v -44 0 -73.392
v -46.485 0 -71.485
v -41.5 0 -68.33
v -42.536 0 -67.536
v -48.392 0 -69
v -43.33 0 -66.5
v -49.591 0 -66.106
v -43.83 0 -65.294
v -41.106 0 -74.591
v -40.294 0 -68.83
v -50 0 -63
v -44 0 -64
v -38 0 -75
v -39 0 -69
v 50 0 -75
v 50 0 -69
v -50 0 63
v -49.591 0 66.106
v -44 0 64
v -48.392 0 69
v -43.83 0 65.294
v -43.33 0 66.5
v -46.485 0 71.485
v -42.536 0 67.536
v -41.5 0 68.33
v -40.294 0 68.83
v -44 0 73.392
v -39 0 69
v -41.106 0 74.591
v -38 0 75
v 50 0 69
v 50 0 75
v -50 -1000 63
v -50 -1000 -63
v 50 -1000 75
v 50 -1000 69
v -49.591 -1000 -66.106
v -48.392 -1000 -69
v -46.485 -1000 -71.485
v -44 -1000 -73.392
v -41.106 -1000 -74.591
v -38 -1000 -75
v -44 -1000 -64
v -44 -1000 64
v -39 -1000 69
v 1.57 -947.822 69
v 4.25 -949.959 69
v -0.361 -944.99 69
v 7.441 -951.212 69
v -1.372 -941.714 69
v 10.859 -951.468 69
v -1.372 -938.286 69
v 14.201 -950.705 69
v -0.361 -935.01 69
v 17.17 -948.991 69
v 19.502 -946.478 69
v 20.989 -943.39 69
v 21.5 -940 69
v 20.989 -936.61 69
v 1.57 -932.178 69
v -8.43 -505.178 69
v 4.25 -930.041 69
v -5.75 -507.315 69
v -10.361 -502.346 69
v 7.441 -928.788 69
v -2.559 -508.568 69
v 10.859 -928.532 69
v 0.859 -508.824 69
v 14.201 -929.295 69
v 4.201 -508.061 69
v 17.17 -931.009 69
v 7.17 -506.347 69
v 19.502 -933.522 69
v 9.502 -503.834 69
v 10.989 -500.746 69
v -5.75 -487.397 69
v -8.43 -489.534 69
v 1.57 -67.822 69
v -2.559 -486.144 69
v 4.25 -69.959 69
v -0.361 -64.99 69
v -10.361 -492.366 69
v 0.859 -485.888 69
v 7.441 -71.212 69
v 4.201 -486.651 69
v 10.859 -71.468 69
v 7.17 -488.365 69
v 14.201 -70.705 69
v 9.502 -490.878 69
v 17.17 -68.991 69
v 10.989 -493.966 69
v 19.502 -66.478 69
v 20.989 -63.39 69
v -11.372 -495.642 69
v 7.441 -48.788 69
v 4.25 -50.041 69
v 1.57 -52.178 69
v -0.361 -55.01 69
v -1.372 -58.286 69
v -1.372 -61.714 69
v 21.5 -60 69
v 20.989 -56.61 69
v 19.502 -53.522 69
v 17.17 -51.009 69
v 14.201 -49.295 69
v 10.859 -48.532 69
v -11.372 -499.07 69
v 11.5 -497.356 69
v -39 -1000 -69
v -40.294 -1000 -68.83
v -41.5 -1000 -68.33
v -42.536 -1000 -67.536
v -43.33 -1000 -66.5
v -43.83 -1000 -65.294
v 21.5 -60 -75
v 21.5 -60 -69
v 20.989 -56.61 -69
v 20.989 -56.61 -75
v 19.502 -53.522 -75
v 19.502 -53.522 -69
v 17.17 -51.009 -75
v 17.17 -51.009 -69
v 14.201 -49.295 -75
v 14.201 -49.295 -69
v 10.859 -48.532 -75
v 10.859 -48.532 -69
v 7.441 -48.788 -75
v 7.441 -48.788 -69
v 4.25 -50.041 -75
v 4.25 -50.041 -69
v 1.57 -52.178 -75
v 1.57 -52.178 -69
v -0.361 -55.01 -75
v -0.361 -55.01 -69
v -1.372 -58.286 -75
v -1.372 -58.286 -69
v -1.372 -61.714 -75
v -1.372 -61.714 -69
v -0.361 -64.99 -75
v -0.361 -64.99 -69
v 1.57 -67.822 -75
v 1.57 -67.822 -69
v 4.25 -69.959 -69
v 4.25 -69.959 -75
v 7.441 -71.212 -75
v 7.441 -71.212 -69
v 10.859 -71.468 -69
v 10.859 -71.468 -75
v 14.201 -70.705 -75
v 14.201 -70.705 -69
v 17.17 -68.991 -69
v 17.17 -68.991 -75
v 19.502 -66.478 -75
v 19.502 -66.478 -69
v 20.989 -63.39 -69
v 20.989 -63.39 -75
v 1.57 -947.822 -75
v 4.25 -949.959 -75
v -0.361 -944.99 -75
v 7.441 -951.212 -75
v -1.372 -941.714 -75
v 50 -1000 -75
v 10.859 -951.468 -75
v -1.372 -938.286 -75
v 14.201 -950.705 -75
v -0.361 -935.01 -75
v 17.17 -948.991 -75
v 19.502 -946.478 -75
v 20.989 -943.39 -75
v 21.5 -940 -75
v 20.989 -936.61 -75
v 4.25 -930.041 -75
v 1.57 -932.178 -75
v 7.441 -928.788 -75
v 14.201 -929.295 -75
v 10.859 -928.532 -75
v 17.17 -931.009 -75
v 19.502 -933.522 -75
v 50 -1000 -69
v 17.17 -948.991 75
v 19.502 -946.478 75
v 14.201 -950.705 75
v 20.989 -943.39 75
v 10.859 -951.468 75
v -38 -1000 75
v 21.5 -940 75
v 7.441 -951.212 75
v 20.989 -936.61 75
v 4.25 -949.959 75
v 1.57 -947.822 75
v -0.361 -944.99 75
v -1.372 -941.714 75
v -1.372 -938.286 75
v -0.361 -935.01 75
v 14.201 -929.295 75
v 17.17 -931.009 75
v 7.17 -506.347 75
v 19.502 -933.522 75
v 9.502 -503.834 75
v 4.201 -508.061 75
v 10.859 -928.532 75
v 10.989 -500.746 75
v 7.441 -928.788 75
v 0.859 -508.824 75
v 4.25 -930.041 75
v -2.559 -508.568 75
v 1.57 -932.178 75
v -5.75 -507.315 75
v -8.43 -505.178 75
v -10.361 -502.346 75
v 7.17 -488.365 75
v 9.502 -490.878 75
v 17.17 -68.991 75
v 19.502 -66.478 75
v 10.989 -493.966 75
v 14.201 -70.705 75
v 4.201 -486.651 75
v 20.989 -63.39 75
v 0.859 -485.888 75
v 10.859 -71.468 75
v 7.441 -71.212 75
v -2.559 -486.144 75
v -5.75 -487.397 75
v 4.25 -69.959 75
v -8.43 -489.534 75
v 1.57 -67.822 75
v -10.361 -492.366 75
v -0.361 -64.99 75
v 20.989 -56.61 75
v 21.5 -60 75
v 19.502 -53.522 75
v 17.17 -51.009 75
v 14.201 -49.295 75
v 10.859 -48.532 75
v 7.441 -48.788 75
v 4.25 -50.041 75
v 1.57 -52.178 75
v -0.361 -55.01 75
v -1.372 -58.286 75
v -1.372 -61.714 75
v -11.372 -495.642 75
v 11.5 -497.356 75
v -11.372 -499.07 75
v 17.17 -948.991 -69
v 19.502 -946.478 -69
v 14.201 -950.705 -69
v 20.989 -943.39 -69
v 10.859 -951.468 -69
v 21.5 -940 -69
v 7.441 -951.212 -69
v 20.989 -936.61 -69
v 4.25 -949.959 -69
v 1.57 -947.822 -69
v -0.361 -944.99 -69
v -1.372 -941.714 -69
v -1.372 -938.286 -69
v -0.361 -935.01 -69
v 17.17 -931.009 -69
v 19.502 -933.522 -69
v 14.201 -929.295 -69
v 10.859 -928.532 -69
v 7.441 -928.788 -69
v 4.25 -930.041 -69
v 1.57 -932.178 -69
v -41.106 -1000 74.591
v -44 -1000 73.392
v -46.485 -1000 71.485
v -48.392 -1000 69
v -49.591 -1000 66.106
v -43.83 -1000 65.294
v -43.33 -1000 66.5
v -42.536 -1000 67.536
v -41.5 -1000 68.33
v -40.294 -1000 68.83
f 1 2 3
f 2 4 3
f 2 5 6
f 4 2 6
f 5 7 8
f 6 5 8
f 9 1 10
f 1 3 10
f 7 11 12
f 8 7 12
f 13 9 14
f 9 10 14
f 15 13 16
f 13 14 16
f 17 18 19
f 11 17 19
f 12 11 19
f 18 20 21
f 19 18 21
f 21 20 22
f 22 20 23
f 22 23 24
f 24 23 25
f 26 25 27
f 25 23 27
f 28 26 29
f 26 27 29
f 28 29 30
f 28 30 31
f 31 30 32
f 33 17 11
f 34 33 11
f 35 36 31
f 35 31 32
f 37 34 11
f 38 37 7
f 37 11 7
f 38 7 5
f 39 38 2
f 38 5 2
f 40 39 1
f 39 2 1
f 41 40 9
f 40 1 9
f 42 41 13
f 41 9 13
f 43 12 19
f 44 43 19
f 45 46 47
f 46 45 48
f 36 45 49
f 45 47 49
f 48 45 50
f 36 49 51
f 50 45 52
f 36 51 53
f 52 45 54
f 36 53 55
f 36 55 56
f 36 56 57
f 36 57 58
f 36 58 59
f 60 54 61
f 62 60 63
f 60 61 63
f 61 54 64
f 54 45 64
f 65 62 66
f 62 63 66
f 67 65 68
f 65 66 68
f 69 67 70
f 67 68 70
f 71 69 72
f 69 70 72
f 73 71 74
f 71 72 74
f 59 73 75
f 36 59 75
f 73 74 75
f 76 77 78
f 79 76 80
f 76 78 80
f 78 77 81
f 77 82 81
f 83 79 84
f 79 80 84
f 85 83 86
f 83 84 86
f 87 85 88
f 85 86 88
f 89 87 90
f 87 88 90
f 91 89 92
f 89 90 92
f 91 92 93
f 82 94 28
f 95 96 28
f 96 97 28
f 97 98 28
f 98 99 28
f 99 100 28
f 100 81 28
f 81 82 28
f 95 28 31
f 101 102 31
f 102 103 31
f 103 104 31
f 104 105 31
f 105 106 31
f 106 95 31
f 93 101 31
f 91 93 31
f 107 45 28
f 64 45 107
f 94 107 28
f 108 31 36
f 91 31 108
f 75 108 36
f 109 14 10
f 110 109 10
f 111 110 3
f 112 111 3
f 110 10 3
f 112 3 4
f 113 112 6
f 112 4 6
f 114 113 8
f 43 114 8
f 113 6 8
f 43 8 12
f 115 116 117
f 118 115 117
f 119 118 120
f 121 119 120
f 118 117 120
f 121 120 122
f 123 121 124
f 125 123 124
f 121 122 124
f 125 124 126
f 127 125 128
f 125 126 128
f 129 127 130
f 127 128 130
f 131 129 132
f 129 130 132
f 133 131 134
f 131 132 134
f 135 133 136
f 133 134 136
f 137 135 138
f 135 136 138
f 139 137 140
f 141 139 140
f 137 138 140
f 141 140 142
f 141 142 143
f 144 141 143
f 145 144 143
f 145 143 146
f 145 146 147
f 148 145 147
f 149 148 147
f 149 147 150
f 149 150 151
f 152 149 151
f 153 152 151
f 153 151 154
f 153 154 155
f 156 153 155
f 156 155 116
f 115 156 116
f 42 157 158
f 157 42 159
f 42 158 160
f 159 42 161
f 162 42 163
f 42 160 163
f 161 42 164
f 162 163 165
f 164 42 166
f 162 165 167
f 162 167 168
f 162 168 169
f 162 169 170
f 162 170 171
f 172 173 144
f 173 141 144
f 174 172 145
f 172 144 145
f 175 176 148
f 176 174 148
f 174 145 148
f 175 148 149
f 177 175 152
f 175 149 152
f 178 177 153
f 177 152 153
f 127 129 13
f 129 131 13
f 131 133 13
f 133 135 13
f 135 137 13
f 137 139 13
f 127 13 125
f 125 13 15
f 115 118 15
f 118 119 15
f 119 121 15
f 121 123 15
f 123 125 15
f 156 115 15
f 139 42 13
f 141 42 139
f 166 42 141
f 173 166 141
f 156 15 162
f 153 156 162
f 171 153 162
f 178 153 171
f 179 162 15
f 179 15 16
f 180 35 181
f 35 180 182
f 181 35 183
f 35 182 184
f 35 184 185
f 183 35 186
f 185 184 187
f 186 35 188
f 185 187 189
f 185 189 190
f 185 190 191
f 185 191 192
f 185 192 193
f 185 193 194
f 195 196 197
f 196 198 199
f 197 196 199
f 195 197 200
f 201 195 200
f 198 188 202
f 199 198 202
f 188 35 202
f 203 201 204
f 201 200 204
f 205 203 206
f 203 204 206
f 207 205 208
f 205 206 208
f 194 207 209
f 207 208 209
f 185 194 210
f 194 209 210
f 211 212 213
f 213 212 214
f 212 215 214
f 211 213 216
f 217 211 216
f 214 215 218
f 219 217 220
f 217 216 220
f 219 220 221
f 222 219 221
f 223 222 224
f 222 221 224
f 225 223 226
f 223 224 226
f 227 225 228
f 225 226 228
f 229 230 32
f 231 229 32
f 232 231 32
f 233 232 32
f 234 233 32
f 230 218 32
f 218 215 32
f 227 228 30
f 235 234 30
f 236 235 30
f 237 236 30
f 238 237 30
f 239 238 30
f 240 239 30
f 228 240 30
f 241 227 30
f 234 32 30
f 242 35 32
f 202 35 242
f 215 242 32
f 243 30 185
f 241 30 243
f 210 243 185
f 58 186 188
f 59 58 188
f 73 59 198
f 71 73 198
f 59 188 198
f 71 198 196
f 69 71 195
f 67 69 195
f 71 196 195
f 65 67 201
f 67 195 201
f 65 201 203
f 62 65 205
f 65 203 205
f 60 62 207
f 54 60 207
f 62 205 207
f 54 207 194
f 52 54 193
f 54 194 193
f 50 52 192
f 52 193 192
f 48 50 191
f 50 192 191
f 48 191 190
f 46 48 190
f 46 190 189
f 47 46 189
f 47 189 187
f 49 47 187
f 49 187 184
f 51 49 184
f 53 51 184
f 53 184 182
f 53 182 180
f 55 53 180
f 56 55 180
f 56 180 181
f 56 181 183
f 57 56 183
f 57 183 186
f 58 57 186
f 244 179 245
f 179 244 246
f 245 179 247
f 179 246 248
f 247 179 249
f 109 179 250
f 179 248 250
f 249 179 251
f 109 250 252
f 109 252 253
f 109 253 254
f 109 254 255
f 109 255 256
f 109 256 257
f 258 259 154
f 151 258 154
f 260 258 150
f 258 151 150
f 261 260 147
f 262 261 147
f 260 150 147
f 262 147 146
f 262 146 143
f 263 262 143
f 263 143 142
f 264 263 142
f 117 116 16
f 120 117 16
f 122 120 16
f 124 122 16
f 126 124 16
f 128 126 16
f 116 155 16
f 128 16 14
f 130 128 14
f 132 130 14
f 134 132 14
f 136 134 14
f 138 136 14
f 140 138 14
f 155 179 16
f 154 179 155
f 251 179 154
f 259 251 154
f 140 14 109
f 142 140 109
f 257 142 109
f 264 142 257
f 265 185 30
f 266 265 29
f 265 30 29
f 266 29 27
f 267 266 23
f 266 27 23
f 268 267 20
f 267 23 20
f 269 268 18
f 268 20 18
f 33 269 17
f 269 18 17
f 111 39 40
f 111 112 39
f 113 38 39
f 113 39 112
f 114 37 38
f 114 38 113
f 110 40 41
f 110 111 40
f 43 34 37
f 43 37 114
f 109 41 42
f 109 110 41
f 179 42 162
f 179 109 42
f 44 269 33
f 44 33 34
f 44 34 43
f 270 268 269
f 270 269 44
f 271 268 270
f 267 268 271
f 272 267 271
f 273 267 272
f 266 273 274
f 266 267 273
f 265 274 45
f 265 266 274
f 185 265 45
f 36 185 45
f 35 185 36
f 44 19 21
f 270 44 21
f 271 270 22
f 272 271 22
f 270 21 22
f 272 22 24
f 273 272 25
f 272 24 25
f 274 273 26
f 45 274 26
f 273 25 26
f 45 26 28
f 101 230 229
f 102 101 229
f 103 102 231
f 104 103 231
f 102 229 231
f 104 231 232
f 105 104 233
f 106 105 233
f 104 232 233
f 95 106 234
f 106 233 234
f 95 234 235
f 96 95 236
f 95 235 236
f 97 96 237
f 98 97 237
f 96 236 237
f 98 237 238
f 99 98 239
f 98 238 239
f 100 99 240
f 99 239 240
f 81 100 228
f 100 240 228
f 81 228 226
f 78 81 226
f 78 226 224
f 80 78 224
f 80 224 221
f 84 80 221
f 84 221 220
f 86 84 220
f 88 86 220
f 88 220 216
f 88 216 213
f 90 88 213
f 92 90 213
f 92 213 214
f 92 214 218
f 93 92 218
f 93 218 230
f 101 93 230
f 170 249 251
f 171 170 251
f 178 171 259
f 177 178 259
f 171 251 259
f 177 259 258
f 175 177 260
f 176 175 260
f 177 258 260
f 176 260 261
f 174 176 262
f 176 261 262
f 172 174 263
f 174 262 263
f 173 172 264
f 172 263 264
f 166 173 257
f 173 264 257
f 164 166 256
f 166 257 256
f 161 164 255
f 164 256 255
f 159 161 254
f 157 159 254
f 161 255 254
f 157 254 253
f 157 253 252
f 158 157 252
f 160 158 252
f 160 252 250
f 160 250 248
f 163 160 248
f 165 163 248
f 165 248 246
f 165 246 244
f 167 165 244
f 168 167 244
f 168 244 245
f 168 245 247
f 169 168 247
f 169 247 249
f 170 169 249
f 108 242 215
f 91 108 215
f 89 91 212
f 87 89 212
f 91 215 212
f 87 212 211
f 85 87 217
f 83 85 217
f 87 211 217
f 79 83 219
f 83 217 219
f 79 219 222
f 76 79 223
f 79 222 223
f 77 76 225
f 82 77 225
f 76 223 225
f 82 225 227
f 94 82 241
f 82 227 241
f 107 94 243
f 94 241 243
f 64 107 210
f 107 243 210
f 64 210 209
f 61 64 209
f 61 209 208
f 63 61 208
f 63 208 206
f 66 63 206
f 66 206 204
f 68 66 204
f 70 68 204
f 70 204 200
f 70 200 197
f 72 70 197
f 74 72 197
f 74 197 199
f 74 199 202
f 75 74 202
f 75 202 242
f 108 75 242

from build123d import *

# Parameters (mm, degrees)
F1_DEPTH = 1000
F2_R     = 11.5
F3_DEPTH = 175
F6_R     = 11.5
F7_DEPTH = 25


with BuildPart() as f1:
    # F0 (on Front) → F1 (new body)
    with BuildSketch(Plane.XZ):
        with BuildLine():
            Line((50, 75), (-38, 75))
            ThreePointArc((-38, 75), (-46.485281, 71.485281), (-50, 63))
            Line((-50, 63), (-50, -63))
            ThreePointArc((-50, -63), (-46.485281, -71.485281), (-38, -75))
            Line((-38, -75), (50, -75))
            Line((50, -75), (50, -69))
            Line((50, -69), (-39, -69))
            ThreePointArc((-39, -69), (-42.535534, -67.535534), (-44, -64))
            Line((-44, -64), (-44, 64))
            ThreePointArc((-44, 64), (-42.535534, 67.535534), (-39, 69))
            Line((-39, 69), (50, 69))
            Line((50, 69), (50, 75))
        make_face()
    extrude(amount=F1_DEPTH)

    # F2 (on face) → F3 (cut)
    with BuildSketch(Plane.XY.offset(75)):
        with Locations((10, -60)):
            Circle(F2_R)
        with Locations((10, -940)):
            Circle(F2_R)
    extrude(amount=-F3_DEPTH, mode=Mode.SUBTRACT)

    # F6 (on face) → F7 (cut)
    with BuildSketch(Plane.XY.offset(75)):
        with Locations((0, -497.356147)):
            Circle(F6_R)
    extrude(amount=-F7_DEPTH, mode=Mode.SUBTRACT)


with BuildPart() as f4_1:
    # F4: copy of F1
    add(f1.part.moved(Location((300, 0, 0))))


solid = f1.part
